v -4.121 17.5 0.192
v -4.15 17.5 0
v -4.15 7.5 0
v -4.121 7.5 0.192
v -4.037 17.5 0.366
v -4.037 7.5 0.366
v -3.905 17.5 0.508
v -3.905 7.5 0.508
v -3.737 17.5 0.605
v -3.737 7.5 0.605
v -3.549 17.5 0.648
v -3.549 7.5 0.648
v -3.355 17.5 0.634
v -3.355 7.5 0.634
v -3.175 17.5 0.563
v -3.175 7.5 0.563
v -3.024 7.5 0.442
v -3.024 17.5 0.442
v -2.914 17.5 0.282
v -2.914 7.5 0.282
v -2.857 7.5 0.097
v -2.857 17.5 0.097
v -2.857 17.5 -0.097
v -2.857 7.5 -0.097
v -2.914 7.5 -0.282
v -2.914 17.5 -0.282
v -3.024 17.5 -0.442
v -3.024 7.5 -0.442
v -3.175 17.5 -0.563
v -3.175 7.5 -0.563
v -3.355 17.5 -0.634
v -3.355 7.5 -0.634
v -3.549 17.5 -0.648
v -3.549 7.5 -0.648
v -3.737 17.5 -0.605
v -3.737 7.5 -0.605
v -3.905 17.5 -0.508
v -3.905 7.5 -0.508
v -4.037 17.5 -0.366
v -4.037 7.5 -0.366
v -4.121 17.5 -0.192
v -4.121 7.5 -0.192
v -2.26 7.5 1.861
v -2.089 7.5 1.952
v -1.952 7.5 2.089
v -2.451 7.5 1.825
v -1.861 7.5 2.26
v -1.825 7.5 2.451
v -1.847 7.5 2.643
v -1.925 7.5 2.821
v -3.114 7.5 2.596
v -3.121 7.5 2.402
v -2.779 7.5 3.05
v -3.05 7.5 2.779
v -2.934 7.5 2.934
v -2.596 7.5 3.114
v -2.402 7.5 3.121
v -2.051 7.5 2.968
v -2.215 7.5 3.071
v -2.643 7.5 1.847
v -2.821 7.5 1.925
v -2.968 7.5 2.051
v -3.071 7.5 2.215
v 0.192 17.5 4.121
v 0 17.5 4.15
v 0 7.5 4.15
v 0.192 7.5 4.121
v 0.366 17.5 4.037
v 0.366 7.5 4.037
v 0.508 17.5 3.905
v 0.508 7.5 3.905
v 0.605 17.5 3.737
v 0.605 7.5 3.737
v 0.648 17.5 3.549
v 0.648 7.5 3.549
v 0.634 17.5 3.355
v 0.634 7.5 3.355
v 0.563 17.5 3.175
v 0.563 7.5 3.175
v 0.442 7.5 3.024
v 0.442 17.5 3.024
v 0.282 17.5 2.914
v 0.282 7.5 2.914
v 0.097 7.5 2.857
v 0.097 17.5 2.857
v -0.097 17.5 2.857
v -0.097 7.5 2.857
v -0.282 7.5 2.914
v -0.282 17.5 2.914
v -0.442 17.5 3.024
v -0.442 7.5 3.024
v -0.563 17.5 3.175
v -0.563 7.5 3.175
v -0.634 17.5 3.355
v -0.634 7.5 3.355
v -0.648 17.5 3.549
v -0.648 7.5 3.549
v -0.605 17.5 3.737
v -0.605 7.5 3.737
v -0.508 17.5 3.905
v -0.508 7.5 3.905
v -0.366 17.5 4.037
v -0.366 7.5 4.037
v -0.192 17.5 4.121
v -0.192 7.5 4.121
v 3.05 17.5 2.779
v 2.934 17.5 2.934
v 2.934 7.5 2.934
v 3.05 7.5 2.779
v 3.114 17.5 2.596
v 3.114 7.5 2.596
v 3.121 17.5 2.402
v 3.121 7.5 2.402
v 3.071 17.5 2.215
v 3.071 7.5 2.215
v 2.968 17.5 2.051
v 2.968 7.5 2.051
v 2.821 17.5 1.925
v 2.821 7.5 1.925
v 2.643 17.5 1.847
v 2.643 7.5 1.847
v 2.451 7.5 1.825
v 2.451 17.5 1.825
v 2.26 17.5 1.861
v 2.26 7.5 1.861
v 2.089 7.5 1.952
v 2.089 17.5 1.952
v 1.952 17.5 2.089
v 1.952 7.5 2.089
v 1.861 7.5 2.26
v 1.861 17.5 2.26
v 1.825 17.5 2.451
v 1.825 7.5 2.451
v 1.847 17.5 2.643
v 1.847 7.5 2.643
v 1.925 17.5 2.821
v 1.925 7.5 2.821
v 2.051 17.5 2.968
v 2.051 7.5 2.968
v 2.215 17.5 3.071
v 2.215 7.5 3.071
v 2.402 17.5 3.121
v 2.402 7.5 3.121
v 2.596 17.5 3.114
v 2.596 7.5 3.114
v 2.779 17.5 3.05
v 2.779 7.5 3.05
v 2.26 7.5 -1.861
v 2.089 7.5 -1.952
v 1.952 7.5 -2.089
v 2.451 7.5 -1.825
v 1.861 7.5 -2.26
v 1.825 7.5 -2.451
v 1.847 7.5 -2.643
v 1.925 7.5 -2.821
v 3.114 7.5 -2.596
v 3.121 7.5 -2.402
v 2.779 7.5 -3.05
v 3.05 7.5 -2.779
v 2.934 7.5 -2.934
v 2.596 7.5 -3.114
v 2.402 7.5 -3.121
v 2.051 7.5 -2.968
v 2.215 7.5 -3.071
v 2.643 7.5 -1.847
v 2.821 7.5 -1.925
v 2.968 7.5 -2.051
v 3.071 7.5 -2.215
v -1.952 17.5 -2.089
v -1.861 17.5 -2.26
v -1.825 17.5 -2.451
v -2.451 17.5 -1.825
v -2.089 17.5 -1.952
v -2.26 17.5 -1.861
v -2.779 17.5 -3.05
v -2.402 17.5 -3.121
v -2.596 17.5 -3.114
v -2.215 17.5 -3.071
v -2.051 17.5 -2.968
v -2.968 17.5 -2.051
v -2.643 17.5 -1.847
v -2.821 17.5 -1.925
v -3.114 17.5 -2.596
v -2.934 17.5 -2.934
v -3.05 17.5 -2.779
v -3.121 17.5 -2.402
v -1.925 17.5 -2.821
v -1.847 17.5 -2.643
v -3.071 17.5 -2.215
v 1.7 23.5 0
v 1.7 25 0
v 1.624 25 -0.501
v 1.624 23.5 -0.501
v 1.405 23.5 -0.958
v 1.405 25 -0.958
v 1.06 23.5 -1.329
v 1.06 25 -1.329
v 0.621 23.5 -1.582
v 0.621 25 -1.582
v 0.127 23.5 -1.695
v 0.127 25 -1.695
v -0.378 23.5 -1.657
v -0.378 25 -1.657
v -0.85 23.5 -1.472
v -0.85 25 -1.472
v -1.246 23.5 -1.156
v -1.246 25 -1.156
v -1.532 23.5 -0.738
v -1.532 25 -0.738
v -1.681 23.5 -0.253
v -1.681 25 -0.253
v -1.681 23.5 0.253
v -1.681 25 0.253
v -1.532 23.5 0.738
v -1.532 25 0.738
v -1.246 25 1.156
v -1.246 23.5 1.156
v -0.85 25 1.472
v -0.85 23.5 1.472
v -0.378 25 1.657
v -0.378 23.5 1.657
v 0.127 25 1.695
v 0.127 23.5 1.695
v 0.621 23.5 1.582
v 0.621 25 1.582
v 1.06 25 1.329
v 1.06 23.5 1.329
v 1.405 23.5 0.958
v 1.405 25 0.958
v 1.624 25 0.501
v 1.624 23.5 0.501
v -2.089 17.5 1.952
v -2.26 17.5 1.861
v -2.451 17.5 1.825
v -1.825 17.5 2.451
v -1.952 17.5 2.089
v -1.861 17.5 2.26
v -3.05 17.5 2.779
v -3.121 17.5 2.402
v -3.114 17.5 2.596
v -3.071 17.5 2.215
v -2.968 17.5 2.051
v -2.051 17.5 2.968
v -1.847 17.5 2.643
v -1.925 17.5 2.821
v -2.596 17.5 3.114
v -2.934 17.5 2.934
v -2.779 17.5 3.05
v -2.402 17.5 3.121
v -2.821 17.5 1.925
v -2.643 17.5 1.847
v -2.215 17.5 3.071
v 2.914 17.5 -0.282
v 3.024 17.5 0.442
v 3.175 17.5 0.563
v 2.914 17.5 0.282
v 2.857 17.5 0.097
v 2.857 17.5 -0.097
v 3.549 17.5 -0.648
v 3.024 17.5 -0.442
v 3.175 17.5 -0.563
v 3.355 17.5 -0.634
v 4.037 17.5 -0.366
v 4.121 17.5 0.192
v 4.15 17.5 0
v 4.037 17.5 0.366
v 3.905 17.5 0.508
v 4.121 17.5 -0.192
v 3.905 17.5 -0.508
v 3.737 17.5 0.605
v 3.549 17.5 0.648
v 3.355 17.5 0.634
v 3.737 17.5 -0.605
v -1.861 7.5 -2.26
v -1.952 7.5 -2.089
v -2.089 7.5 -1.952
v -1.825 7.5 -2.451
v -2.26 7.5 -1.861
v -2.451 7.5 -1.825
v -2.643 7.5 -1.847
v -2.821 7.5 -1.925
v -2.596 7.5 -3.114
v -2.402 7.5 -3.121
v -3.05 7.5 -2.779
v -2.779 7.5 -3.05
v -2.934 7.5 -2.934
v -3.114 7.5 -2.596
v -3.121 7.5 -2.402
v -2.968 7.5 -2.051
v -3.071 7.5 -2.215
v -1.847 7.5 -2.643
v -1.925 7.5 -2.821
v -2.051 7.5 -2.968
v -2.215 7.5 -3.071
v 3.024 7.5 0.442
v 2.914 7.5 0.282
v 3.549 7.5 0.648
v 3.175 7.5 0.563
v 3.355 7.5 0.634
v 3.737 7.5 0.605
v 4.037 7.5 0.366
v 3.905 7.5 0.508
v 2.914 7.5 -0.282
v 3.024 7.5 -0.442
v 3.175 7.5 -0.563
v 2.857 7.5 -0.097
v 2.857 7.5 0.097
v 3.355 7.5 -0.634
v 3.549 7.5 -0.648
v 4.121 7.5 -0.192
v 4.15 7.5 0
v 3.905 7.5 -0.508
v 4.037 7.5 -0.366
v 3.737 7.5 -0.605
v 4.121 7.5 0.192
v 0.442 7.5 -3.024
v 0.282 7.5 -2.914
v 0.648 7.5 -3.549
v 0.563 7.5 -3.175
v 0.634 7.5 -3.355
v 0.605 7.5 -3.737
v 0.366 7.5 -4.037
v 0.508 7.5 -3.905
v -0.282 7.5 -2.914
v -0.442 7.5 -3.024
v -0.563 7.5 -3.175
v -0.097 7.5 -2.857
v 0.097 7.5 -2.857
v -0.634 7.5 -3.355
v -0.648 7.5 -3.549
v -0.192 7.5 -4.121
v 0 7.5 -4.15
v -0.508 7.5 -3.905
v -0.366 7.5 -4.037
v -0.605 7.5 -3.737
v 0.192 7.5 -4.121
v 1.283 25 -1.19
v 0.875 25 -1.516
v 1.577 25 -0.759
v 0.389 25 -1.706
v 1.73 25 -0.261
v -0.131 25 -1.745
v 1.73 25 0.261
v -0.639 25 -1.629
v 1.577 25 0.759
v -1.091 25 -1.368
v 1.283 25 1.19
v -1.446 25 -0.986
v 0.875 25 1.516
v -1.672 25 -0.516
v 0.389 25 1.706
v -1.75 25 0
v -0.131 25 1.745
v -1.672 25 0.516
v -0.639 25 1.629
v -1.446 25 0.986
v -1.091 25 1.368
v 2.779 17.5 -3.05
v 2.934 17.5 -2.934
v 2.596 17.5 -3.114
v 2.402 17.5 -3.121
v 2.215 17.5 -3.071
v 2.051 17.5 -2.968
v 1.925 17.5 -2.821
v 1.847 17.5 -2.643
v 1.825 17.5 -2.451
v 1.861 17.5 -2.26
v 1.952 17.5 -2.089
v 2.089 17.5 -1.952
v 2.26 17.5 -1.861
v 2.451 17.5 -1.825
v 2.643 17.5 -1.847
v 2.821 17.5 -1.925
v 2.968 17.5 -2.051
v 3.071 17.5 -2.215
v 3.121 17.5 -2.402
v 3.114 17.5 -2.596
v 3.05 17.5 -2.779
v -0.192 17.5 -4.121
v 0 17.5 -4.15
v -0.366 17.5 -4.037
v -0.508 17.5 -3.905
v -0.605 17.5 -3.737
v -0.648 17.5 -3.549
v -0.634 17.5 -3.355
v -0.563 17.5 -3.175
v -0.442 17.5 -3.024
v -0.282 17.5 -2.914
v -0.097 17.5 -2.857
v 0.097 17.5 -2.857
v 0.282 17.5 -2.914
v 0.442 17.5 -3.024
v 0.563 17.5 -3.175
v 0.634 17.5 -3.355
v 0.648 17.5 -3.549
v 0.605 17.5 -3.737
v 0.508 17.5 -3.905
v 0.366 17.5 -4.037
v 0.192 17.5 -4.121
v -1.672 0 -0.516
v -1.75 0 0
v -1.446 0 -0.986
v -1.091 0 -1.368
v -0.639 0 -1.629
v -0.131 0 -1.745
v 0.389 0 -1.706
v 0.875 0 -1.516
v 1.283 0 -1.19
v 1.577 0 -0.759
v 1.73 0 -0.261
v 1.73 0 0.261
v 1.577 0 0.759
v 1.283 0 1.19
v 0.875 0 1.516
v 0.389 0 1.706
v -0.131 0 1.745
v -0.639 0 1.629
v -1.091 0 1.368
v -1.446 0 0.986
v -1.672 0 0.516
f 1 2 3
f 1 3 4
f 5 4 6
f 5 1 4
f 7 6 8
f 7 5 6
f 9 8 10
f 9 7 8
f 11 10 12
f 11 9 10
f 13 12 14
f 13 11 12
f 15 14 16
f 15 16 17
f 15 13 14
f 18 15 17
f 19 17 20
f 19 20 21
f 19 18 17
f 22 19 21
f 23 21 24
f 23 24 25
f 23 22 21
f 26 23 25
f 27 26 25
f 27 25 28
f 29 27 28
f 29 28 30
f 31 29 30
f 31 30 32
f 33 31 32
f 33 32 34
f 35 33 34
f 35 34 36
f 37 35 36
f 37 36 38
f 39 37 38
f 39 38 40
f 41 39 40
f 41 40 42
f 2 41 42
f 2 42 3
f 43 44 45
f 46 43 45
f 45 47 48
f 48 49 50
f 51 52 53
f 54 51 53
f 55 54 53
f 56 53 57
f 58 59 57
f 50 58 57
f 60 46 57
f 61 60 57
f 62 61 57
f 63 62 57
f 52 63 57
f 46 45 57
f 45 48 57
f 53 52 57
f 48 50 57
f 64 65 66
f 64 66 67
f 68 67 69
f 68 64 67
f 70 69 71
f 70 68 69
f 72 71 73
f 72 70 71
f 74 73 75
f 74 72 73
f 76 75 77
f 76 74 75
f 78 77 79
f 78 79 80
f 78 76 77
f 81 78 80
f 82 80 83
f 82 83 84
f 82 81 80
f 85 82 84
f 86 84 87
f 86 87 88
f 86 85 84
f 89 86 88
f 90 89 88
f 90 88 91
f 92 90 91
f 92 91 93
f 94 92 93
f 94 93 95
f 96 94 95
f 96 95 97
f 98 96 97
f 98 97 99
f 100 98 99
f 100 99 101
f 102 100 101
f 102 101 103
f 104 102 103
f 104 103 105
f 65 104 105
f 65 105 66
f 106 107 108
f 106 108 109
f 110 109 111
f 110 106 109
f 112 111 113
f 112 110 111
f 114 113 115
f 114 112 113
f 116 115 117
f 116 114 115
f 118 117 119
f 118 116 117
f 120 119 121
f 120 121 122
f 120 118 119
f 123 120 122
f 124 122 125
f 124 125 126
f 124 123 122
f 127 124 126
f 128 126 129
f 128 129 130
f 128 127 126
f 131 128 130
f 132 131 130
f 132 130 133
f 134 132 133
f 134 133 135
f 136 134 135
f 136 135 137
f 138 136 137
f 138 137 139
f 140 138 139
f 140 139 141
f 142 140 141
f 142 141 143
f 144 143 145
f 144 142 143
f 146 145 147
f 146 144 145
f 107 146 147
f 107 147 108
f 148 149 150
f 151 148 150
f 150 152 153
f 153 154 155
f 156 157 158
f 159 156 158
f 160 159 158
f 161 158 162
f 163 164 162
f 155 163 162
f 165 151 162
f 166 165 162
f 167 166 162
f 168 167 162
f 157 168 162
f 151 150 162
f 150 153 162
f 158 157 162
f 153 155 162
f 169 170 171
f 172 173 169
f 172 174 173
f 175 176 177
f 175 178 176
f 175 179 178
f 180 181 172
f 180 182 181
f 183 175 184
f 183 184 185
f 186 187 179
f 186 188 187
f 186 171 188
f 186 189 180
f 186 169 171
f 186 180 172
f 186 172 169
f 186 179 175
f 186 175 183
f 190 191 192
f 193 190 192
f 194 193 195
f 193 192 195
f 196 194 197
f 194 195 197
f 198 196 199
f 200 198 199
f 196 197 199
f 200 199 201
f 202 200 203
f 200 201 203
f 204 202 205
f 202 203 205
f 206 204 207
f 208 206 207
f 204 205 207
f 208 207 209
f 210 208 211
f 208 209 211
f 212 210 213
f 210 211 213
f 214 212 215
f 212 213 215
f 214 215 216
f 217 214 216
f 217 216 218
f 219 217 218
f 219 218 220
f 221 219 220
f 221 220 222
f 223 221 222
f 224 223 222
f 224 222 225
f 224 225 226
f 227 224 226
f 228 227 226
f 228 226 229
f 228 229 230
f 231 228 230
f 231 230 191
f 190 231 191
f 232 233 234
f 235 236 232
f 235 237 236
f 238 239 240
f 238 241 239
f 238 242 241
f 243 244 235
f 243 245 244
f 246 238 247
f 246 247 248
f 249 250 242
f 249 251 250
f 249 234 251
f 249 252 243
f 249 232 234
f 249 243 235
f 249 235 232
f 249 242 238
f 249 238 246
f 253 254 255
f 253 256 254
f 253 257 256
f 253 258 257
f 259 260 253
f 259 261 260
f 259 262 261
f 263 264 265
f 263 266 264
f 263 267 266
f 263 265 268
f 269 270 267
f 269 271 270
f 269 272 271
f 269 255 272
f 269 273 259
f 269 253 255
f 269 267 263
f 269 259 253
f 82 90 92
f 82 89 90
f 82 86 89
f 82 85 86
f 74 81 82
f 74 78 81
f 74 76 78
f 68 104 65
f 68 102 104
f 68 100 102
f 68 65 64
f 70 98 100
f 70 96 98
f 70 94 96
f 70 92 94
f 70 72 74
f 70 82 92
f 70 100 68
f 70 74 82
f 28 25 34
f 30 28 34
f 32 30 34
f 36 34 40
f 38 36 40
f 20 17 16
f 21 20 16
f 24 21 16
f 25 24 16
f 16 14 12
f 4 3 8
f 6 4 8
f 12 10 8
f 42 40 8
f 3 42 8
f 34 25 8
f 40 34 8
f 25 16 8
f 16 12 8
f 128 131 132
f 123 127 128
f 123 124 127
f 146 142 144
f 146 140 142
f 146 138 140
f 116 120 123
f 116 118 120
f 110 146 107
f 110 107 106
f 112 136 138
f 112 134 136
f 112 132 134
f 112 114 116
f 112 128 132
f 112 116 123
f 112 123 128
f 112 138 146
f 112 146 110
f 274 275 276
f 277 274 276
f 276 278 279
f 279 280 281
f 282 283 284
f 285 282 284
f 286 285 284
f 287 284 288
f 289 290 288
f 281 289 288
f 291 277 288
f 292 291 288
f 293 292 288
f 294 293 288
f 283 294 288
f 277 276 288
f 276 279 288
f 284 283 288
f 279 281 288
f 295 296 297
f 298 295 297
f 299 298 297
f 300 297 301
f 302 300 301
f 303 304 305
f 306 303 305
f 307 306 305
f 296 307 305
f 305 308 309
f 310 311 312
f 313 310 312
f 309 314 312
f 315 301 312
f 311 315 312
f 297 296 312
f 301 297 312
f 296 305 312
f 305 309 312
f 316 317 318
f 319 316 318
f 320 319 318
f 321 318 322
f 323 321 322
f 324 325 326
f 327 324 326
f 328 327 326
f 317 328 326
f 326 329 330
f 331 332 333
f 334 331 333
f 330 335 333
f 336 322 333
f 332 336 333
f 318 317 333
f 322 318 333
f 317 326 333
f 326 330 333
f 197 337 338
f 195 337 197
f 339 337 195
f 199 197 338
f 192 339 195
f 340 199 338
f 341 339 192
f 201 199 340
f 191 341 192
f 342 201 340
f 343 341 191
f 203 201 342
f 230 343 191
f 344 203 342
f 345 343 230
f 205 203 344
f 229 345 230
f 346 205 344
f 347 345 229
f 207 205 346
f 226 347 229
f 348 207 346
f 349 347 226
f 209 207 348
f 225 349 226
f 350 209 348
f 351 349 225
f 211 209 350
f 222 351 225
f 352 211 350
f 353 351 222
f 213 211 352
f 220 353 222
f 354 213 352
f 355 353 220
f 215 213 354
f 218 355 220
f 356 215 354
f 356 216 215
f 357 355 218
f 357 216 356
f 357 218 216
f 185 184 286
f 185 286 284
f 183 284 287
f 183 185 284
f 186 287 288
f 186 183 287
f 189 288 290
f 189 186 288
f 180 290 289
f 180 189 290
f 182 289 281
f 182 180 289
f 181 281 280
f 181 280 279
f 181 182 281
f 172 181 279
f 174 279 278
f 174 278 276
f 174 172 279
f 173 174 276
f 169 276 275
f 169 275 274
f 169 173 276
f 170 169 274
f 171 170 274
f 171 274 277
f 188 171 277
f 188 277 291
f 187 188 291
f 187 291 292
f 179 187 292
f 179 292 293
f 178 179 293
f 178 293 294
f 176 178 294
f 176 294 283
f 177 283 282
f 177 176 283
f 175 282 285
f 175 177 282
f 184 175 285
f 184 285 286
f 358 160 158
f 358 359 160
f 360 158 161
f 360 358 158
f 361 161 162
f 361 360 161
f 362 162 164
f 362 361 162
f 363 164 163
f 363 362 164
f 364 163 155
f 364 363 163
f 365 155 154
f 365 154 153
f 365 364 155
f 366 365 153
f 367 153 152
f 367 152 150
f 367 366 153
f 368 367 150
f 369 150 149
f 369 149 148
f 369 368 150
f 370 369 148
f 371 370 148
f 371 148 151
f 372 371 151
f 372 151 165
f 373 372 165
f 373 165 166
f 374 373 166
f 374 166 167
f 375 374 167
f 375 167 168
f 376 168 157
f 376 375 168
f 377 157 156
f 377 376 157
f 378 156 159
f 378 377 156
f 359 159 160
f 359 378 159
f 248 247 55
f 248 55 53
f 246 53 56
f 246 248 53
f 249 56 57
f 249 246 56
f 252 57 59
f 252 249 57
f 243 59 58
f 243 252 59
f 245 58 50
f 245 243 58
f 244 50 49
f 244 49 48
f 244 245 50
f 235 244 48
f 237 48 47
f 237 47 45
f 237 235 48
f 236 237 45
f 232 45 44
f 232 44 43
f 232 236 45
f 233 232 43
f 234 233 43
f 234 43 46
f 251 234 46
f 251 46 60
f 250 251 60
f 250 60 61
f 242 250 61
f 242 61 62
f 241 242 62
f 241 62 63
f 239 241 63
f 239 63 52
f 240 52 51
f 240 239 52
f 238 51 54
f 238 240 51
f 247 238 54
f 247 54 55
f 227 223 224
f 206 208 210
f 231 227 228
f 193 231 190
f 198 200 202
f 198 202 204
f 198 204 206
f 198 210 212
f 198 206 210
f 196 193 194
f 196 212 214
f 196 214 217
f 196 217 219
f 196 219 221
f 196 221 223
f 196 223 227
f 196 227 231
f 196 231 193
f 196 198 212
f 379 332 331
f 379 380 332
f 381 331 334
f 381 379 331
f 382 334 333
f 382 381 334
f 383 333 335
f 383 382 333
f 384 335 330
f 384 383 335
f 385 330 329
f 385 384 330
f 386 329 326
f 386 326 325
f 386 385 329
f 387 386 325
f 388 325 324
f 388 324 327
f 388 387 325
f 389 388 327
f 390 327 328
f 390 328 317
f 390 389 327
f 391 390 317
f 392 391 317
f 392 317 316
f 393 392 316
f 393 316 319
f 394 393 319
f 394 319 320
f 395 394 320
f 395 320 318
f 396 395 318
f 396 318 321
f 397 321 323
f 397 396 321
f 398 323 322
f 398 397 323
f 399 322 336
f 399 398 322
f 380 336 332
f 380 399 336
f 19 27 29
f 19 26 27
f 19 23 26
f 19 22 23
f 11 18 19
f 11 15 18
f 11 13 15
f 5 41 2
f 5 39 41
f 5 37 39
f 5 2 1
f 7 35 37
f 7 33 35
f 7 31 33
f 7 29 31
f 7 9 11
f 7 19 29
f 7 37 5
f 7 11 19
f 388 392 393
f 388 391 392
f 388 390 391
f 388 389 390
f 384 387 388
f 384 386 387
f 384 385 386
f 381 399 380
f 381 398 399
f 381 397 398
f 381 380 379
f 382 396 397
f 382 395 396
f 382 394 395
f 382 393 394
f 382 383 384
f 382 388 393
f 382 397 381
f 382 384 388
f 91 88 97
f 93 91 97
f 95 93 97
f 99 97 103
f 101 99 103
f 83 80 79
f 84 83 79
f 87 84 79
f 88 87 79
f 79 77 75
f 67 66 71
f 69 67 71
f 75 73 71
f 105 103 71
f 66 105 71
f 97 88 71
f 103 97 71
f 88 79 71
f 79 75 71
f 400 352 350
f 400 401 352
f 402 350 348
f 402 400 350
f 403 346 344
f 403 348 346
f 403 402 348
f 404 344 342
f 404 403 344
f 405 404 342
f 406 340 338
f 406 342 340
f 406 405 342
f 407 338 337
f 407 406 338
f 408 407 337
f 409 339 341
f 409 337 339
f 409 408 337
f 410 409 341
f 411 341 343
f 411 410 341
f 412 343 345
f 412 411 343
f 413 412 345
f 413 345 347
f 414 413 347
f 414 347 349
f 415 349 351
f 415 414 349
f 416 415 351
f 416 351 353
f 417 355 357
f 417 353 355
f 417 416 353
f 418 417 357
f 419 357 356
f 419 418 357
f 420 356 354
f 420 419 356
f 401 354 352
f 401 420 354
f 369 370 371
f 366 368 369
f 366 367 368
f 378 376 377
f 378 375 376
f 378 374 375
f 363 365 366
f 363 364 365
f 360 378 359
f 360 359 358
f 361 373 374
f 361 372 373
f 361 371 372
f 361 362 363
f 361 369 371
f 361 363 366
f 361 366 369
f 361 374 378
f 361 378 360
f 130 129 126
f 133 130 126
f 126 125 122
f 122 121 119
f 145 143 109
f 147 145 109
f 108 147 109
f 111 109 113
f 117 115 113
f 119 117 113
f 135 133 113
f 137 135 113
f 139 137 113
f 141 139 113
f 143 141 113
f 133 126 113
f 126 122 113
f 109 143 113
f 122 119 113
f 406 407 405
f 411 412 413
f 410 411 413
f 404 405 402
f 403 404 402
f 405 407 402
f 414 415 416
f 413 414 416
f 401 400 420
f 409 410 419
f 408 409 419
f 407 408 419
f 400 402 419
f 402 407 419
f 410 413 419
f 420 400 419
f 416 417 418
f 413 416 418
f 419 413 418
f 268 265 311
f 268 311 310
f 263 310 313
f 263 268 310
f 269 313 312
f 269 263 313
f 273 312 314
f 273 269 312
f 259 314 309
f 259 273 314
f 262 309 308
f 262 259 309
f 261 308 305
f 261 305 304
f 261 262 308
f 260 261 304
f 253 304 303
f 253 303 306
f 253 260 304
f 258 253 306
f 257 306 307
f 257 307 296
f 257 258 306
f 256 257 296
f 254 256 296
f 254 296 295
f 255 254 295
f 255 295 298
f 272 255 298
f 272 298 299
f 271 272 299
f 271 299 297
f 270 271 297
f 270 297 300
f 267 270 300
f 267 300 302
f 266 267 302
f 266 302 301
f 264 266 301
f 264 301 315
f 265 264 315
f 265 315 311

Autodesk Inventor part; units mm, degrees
ref_plane "YZ Plane" through (0, 0, 0) normal (1, 0, 0) x (0, 1, 0)
ref_plane "XZ Plane" through (0, 0, 0) normal (0, 1, 0) x (-1, 0, 0)
sketch "草圖1" plane through (0, 0, 0) normal (0, 1, 0) x (-1, 0, 0)
  circle A0 centre (0, 0) radius 1.75
  dimension "d0" = 3.5
extrude "擠出1" add sketch "草圖1" along normal blind 25
ref_plane "工作平面1" through (0, 12.5, 0) normal (0, 1, 0) x (1, 0, 0)
sketch "草圖2" plane through (0, 12.5, 0) normal (0, 1, 0) x (1, 0, 0)
  circle A0 centre (0, 0) radius 1.75 projected
  circle A1 centre (0, 0) radius 3.5
  circle A2 centre (3.5, 0) radius 0.65
  dimension "d3" = 7
  dimension "d4" = 1.3
extrude "擠出2" add sketch "草圖2" along normal mid plane 10 contours A1 A2 | A1 A2 picked at (3.2876, -0.1251) picked at (3.6904, -0.1714)
pattern_circular "環形陣列1" count 8 over 360 about axis through (0, 0, 0) along (0, 1, 0) of "擠出2"
sketch "草圖3" plane through (0, 25, 0) normal (0, 1, 0) x (1, 0, 0)
  circle A0 centre (0, 0) radius 1.7
  dimension "d10" = 3.4
extrude "擠出3" cut sketch "草圖3" against normal blind 1.5
properties part number "110033226_ipt_53_散步橋圓柱"
